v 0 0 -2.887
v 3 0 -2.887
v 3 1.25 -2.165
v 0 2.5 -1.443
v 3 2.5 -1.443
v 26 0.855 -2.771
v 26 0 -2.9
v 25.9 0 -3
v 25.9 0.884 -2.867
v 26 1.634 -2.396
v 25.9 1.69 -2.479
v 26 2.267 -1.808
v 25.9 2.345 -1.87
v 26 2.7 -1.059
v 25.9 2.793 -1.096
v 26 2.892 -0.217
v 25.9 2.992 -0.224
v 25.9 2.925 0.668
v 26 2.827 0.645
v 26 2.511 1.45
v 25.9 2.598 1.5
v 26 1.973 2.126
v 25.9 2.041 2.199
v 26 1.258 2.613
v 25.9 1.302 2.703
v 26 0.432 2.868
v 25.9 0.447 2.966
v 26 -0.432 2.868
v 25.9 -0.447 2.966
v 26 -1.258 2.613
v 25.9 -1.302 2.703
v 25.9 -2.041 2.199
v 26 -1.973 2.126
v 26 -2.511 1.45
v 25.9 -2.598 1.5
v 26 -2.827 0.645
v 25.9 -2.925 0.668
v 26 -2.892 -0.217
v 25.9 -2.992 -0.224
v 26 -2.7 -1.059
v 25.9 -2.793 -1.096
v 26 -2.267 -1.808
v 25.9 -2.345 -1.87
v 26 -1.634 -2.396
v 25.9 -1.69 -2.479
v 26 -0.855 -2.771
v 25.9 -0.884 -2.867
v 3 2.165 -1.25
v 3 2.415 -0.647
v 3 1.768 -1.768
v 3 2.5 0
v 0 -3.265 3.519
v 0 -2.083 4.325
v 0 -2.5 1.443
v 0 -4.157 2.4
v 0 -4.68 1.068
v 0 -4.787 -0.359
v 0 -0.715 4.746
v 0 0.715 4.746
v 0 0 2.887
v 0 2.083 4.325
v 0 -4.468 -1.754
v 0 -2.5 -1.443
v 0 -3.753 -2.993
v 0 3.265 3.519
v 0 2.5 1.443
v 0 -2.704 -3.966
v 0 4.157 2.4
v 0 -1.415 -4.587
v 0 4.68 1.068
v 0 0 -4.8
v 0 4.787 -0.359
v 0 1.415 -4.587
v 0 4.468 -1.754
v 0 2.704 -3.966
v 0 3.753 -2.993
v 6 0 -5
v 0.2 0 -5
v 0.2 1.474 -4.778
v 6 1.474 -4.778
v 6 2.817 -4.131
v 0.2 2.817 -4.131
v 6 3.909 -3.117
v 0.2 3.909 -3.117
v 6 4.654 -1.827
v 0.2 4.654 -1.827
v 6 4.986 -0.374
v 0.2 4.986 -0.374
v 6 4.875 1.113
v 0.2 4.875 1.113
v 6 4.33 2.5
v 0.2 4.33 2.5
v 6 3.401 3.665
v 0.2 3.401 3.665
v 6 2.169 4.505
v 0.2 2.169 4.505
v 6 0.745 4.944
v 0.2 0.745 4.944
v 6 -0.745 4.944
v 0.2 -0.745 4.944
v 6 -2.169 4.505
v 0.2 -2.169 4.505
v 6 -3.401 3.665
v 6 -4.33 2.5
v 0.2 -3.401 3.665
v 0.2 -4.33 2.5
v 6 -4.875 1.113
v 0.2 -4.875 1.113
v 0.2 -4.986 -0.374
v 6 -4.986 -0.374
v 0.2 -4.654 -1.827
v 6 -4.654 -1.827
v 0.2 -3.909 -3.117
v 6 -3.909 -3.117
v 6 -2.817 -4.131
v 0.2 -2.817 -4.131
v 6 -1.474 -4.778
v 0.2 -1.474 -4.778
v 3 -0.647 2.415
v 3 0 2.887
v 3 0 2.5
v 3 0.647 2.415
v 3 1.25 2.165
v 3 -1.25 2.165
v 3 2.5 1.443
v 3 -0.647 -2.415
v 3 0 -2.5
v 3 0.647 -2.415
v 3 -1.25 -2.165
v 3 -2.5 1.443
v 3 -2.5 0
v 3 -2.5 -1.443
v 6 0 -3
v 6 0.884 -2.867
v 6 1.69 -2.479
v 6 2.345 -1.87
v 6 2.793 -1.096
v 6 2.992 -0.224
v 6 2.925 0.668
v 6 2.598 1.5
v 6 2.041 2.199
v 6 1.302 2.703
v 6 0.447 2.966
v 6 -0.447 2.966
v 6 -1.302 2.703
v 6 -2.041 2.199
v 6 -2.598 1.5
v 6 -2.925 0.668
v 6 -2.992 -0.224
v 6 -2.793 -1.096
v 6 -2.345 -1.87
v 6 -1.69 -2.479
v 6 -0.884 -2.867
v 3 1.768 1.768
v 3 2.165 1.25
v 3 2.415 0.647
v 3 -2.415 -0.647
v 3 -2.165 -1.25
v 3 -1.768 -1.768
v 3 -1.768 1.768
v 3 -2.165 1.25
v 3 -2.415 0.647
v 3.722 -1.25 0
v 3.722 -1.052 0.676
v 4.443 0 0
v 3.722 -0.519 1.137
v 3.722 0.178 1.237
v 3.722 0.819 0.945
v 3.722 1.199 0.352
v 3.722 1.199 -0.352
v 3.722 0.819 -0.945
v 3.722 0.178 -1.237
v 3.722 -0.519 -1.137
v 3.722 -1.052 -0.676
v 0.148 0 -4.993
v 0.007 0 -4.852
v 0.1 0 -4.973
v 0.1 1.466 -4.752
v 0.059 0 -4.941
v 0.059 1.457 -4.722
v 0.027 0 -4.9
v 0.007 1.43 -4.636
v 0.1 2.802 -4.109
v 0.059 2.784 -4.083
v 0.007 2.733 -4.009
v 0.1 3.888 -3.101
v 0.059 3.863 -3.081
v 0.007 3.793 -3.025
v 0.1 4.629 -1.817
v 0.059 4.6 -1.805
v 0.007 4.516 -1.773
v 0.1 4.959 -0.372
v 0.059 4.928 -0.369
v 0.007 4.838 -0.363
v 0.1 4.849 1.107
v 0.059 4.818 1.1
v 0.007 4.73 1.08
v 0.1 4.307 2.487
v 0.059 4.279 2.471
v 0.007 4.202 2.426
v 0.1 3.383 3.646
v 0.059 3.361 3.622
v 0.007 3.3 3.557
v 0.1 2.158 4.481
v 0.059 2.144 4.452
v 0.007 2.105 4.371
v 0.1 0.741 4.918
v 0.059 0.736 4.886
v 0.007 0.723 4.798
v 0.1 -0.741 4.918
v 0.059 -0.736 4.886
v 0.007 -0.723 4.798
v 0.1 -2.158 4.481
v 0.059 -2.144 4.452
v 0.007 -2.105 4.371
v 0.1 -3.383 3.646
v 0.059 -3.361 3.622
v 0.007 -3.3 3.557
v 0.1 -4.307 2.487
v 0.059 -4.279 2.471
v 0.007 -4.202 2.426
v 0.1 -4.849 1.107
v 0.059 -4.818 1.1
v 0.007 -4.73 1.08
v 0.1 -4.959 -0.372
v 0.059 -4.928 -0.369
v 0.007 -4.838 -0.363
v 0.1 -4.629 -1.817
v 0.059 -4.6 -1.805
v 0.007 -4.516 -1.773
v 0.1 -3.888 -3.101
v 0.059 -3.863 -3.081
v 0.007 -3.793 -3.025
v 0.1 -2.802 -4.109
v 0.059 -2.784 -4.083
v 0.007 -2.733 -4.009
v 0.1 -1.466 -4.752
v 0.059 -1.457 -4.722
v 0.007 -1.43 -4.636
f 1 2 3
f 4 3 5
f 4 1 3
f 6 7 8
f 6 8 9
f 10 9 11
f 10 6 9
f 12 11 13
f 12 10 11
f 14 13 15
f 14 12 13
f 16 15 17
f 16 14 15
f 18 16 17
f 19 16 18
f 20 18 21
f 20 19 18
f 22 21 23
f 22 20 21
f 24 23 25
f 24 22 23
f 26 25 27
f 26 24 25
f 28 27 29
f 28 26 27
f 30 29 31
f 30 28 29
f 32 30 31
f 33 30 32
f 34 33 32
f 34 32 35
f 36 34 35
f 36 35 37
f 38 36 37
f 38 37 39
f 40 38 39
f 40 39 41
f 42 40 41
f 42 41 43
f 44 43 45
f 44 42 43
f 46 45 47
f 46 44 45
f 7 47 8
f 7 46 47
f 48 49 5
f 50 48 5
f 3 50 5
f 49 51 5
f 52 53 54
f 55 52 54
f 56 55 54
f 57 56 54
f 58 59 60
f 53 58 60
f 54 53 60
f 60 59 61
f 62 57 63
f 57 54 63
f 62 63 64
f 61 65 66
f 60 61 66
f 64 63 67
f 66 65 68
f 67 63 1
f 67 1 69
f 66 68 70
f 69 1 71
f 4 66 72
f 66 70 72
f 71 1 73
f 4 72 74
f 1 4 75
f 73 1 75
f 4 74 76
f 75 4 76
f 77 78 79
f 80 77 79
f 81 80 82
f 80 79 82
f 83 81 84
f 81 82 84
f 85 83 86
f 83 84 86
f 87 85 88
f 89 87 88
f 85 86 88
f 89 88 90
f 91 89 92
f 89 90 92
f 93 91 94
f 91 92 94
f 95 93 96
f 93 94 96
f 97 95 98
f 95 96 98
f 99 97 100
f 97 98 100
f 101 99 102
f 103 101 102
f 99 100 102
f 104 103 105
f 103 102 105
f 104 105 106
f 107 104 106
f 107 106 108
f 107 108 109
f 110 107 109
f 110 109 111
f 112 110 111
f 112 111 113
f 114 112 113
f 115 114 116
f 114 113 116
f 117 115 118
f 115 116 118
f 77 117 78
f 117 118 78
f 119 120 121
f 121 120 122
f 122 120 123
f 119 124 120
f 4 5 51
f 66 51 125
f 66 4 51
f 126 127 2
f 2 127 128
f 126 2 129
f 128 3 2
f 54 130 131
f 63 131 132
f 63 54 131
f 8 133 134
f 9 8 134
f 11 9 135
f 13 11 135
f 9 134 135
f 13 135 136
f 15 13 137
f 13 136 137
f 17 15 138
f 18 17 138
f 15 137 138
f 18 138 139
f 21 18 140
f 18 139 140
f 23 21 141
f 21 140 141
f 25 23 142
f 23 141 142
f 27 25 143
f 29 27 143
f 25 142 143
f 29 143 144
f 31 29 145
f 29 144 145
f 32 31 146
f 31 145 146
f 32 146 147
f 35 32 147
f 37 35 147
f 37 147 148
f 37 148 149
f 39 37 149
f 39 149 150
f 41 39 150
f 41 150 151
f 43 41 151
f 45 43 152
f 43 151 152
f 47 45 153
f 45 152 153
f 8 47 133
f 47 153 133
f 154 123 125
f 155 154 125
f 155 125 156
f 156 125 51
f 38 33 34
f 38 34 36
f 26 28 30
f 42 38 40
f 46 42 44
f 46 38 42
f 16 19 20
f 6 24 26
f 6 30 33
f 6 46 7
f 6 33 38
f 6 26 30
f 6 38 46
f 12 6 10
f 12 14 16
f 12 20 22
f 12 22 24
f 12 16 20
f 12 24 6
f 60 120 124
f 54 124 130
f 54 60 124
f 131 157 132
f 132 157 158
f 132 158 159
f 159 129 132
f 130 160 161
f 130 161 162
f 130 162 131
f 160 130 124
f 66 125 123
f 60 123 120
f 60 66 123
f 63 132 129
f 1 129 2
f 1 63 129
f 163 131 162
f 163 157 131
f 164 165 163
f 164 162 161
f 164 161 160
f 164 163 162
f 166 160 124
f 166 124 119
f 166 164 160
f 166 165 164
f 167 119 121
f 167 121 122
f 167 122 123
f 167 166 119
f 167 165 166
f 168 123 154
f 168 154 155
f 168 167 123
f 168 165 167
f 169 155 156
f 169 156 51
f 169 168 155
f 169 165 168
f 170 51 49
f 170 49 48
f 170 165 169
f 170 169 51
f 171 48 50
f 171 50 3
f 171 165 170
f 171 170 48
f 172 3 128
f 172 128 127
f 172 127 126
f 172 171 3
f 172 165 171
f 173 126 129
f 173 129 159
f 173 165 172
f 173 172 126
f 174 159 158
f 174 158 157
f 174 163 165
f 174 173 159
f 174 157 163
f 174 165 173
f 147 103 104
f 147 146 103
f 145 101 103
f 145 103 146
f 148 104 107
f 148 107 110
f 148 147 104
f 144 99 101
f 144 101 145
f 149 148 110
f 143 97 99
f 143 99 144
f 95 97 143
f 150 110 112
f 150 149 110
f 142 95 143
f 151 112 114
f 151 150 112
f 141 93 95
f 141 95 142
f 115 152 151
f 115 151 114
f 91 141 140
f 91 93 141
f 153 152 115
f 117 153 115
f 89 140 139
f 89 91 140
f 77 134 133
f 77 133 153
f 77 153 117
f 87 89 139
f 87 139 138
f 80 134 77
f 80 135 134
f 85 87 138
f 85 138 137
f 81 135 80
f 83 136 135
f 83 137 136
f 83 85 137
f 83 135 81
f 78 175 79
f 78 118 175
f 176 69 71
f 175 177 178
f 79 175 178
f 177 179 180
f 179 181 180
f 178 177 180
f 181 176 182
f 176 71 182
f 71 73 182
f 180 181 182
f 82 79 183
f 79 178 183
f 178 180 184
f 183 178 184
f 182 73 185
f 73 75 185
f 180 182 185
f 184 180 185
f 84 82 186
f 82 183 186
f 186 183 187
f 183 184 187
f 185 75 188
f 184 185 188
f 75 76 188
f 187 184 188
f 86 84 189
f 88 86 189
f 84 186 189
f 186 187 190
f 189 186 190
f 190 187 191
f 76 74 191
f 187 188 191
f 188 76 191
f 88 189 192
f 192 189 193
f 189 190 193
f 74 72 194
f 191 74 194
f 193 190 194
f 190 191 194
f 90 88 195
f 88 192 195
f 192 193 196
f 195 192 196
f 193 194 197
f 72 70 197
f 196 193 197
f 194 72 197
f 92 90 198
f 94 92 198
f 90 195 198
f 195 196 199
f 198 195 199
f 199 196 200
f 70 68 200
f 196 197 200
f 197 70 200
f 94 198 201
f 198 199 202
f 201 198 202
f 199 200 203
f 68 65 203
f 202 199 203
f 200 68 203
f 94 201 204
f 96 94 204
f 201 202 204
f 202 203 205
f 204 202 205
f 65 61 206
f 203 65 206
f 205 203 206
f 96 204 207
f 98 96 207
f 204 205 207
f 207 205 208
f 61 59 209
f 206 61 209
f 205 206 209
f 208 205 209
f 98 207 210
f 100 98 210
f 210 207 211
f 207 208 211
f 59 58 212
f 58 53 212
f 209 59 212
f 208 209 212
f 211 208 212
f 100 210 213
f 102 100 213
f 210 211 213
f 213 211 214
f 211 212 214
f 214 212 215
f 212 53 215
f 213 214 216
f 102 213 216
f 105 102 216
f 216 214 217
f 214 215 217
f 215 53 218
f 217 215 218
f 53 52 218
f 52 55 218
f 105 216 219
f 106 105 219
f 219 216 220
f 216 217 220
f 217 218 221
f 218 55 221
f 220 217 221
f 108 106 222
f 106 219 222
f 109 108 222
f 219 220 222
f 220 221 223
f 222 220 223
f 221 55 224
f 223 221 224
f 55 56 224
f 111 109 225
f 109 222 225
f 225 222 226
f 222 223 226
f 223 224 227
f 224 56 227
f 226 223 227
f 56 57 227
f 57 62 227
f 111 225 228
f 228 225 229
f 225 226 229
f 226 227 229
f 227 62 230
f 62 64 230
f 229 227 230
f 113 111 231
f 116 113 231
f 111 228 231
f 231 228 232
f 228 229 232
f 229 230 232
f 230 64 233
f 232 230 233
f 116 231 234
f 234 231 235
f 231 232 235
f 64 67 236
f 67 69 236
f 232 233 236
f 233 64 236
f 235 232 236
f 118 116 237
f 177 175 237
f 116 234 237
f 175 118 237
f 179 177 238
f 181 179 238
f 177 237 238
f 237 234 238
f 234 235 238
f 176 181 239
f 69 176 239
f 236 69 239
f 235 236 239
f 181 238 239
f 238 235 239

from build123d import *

# Parameters (mm, degrees)
SKETCH1_R           = 5
BASEHEAD_DEPTH      = 6
SKETCH2_R           = 3
BASEBODY_DEPTH      = 20
HEXAGONSOCKET_DEPTH = 3
TOPFILLET_R         = 0.2
CHAMFER1_SIZE       = 0.1


with BuildPart() as part:
    # Sketch1 → BaseHead (new body)
    with BuildSketch(Plane(origin=(0, 0, 0), x_dir=(0, 0, -1), z_dir=(1, 0, 0))):
        Circle(SKETCH1_R)
    extrude(amount=BASEHEAD_DEPTH)

    # Sketch2 → BaseBody (add)
    with BuildSketch(Plane(origin=(6, 0, 0), x_dir=(0, 0, -1), z_dir=(1, 0, 0))):
        Circle(SKETCH2_R)
    extrude(amount=BASEBODY_DEPTH)

    # Sketch3 → HexagonSocket (cut)
    with BuildSketch(Plane(origin=(0, 0, 0), x_dir=(0, 0, -1), z_dir=(1, 0, 0))):
        Polygon((2.886751346, 0), (1.443375673, 2.5), (-1.443375673, 2.5), (-2.886751346, 0), (-1.443375673, -2.5), (1.443375673, -2.5), align=None)
    extrude(amount=HEXAGONSOCKET_DEPTH, mode=Mode.SUBTRACT)

    # Sketch4 → Cut-Revolve1 (revolve, cut)
    with BuildSketch(Plane(origin=(-4.19613823, 0.75, 0), x_dir=(-1, 0, 0), z_dir=(0, 0, 1))):
        Polygon((-7.19613823, 3.25), (-8.639513903, 0.75), (-7.19613823, 0.75), align=None)
    revolve(axis=Axis((0.838992387, 0, 0), (-1, 0, 0)), mode=Mode.SUBTRACT)

    # TopFillet
    topfillet_edges = [part.edges().sort_by_distance(p)[0] for p in [
        (0, 0, 5),
    ]]
    fillet(topfillet_edges, radius=TOPFILLET_R)

    # Chamfer1
    chamfer1_edges = [part.edges().sort_by_distance(p)[0] for p in [
        (26, 0, 3),
    ]]
    chamfer(chamfer1_edges, length=CHAMFER1_SIZE)


solid = part.part
